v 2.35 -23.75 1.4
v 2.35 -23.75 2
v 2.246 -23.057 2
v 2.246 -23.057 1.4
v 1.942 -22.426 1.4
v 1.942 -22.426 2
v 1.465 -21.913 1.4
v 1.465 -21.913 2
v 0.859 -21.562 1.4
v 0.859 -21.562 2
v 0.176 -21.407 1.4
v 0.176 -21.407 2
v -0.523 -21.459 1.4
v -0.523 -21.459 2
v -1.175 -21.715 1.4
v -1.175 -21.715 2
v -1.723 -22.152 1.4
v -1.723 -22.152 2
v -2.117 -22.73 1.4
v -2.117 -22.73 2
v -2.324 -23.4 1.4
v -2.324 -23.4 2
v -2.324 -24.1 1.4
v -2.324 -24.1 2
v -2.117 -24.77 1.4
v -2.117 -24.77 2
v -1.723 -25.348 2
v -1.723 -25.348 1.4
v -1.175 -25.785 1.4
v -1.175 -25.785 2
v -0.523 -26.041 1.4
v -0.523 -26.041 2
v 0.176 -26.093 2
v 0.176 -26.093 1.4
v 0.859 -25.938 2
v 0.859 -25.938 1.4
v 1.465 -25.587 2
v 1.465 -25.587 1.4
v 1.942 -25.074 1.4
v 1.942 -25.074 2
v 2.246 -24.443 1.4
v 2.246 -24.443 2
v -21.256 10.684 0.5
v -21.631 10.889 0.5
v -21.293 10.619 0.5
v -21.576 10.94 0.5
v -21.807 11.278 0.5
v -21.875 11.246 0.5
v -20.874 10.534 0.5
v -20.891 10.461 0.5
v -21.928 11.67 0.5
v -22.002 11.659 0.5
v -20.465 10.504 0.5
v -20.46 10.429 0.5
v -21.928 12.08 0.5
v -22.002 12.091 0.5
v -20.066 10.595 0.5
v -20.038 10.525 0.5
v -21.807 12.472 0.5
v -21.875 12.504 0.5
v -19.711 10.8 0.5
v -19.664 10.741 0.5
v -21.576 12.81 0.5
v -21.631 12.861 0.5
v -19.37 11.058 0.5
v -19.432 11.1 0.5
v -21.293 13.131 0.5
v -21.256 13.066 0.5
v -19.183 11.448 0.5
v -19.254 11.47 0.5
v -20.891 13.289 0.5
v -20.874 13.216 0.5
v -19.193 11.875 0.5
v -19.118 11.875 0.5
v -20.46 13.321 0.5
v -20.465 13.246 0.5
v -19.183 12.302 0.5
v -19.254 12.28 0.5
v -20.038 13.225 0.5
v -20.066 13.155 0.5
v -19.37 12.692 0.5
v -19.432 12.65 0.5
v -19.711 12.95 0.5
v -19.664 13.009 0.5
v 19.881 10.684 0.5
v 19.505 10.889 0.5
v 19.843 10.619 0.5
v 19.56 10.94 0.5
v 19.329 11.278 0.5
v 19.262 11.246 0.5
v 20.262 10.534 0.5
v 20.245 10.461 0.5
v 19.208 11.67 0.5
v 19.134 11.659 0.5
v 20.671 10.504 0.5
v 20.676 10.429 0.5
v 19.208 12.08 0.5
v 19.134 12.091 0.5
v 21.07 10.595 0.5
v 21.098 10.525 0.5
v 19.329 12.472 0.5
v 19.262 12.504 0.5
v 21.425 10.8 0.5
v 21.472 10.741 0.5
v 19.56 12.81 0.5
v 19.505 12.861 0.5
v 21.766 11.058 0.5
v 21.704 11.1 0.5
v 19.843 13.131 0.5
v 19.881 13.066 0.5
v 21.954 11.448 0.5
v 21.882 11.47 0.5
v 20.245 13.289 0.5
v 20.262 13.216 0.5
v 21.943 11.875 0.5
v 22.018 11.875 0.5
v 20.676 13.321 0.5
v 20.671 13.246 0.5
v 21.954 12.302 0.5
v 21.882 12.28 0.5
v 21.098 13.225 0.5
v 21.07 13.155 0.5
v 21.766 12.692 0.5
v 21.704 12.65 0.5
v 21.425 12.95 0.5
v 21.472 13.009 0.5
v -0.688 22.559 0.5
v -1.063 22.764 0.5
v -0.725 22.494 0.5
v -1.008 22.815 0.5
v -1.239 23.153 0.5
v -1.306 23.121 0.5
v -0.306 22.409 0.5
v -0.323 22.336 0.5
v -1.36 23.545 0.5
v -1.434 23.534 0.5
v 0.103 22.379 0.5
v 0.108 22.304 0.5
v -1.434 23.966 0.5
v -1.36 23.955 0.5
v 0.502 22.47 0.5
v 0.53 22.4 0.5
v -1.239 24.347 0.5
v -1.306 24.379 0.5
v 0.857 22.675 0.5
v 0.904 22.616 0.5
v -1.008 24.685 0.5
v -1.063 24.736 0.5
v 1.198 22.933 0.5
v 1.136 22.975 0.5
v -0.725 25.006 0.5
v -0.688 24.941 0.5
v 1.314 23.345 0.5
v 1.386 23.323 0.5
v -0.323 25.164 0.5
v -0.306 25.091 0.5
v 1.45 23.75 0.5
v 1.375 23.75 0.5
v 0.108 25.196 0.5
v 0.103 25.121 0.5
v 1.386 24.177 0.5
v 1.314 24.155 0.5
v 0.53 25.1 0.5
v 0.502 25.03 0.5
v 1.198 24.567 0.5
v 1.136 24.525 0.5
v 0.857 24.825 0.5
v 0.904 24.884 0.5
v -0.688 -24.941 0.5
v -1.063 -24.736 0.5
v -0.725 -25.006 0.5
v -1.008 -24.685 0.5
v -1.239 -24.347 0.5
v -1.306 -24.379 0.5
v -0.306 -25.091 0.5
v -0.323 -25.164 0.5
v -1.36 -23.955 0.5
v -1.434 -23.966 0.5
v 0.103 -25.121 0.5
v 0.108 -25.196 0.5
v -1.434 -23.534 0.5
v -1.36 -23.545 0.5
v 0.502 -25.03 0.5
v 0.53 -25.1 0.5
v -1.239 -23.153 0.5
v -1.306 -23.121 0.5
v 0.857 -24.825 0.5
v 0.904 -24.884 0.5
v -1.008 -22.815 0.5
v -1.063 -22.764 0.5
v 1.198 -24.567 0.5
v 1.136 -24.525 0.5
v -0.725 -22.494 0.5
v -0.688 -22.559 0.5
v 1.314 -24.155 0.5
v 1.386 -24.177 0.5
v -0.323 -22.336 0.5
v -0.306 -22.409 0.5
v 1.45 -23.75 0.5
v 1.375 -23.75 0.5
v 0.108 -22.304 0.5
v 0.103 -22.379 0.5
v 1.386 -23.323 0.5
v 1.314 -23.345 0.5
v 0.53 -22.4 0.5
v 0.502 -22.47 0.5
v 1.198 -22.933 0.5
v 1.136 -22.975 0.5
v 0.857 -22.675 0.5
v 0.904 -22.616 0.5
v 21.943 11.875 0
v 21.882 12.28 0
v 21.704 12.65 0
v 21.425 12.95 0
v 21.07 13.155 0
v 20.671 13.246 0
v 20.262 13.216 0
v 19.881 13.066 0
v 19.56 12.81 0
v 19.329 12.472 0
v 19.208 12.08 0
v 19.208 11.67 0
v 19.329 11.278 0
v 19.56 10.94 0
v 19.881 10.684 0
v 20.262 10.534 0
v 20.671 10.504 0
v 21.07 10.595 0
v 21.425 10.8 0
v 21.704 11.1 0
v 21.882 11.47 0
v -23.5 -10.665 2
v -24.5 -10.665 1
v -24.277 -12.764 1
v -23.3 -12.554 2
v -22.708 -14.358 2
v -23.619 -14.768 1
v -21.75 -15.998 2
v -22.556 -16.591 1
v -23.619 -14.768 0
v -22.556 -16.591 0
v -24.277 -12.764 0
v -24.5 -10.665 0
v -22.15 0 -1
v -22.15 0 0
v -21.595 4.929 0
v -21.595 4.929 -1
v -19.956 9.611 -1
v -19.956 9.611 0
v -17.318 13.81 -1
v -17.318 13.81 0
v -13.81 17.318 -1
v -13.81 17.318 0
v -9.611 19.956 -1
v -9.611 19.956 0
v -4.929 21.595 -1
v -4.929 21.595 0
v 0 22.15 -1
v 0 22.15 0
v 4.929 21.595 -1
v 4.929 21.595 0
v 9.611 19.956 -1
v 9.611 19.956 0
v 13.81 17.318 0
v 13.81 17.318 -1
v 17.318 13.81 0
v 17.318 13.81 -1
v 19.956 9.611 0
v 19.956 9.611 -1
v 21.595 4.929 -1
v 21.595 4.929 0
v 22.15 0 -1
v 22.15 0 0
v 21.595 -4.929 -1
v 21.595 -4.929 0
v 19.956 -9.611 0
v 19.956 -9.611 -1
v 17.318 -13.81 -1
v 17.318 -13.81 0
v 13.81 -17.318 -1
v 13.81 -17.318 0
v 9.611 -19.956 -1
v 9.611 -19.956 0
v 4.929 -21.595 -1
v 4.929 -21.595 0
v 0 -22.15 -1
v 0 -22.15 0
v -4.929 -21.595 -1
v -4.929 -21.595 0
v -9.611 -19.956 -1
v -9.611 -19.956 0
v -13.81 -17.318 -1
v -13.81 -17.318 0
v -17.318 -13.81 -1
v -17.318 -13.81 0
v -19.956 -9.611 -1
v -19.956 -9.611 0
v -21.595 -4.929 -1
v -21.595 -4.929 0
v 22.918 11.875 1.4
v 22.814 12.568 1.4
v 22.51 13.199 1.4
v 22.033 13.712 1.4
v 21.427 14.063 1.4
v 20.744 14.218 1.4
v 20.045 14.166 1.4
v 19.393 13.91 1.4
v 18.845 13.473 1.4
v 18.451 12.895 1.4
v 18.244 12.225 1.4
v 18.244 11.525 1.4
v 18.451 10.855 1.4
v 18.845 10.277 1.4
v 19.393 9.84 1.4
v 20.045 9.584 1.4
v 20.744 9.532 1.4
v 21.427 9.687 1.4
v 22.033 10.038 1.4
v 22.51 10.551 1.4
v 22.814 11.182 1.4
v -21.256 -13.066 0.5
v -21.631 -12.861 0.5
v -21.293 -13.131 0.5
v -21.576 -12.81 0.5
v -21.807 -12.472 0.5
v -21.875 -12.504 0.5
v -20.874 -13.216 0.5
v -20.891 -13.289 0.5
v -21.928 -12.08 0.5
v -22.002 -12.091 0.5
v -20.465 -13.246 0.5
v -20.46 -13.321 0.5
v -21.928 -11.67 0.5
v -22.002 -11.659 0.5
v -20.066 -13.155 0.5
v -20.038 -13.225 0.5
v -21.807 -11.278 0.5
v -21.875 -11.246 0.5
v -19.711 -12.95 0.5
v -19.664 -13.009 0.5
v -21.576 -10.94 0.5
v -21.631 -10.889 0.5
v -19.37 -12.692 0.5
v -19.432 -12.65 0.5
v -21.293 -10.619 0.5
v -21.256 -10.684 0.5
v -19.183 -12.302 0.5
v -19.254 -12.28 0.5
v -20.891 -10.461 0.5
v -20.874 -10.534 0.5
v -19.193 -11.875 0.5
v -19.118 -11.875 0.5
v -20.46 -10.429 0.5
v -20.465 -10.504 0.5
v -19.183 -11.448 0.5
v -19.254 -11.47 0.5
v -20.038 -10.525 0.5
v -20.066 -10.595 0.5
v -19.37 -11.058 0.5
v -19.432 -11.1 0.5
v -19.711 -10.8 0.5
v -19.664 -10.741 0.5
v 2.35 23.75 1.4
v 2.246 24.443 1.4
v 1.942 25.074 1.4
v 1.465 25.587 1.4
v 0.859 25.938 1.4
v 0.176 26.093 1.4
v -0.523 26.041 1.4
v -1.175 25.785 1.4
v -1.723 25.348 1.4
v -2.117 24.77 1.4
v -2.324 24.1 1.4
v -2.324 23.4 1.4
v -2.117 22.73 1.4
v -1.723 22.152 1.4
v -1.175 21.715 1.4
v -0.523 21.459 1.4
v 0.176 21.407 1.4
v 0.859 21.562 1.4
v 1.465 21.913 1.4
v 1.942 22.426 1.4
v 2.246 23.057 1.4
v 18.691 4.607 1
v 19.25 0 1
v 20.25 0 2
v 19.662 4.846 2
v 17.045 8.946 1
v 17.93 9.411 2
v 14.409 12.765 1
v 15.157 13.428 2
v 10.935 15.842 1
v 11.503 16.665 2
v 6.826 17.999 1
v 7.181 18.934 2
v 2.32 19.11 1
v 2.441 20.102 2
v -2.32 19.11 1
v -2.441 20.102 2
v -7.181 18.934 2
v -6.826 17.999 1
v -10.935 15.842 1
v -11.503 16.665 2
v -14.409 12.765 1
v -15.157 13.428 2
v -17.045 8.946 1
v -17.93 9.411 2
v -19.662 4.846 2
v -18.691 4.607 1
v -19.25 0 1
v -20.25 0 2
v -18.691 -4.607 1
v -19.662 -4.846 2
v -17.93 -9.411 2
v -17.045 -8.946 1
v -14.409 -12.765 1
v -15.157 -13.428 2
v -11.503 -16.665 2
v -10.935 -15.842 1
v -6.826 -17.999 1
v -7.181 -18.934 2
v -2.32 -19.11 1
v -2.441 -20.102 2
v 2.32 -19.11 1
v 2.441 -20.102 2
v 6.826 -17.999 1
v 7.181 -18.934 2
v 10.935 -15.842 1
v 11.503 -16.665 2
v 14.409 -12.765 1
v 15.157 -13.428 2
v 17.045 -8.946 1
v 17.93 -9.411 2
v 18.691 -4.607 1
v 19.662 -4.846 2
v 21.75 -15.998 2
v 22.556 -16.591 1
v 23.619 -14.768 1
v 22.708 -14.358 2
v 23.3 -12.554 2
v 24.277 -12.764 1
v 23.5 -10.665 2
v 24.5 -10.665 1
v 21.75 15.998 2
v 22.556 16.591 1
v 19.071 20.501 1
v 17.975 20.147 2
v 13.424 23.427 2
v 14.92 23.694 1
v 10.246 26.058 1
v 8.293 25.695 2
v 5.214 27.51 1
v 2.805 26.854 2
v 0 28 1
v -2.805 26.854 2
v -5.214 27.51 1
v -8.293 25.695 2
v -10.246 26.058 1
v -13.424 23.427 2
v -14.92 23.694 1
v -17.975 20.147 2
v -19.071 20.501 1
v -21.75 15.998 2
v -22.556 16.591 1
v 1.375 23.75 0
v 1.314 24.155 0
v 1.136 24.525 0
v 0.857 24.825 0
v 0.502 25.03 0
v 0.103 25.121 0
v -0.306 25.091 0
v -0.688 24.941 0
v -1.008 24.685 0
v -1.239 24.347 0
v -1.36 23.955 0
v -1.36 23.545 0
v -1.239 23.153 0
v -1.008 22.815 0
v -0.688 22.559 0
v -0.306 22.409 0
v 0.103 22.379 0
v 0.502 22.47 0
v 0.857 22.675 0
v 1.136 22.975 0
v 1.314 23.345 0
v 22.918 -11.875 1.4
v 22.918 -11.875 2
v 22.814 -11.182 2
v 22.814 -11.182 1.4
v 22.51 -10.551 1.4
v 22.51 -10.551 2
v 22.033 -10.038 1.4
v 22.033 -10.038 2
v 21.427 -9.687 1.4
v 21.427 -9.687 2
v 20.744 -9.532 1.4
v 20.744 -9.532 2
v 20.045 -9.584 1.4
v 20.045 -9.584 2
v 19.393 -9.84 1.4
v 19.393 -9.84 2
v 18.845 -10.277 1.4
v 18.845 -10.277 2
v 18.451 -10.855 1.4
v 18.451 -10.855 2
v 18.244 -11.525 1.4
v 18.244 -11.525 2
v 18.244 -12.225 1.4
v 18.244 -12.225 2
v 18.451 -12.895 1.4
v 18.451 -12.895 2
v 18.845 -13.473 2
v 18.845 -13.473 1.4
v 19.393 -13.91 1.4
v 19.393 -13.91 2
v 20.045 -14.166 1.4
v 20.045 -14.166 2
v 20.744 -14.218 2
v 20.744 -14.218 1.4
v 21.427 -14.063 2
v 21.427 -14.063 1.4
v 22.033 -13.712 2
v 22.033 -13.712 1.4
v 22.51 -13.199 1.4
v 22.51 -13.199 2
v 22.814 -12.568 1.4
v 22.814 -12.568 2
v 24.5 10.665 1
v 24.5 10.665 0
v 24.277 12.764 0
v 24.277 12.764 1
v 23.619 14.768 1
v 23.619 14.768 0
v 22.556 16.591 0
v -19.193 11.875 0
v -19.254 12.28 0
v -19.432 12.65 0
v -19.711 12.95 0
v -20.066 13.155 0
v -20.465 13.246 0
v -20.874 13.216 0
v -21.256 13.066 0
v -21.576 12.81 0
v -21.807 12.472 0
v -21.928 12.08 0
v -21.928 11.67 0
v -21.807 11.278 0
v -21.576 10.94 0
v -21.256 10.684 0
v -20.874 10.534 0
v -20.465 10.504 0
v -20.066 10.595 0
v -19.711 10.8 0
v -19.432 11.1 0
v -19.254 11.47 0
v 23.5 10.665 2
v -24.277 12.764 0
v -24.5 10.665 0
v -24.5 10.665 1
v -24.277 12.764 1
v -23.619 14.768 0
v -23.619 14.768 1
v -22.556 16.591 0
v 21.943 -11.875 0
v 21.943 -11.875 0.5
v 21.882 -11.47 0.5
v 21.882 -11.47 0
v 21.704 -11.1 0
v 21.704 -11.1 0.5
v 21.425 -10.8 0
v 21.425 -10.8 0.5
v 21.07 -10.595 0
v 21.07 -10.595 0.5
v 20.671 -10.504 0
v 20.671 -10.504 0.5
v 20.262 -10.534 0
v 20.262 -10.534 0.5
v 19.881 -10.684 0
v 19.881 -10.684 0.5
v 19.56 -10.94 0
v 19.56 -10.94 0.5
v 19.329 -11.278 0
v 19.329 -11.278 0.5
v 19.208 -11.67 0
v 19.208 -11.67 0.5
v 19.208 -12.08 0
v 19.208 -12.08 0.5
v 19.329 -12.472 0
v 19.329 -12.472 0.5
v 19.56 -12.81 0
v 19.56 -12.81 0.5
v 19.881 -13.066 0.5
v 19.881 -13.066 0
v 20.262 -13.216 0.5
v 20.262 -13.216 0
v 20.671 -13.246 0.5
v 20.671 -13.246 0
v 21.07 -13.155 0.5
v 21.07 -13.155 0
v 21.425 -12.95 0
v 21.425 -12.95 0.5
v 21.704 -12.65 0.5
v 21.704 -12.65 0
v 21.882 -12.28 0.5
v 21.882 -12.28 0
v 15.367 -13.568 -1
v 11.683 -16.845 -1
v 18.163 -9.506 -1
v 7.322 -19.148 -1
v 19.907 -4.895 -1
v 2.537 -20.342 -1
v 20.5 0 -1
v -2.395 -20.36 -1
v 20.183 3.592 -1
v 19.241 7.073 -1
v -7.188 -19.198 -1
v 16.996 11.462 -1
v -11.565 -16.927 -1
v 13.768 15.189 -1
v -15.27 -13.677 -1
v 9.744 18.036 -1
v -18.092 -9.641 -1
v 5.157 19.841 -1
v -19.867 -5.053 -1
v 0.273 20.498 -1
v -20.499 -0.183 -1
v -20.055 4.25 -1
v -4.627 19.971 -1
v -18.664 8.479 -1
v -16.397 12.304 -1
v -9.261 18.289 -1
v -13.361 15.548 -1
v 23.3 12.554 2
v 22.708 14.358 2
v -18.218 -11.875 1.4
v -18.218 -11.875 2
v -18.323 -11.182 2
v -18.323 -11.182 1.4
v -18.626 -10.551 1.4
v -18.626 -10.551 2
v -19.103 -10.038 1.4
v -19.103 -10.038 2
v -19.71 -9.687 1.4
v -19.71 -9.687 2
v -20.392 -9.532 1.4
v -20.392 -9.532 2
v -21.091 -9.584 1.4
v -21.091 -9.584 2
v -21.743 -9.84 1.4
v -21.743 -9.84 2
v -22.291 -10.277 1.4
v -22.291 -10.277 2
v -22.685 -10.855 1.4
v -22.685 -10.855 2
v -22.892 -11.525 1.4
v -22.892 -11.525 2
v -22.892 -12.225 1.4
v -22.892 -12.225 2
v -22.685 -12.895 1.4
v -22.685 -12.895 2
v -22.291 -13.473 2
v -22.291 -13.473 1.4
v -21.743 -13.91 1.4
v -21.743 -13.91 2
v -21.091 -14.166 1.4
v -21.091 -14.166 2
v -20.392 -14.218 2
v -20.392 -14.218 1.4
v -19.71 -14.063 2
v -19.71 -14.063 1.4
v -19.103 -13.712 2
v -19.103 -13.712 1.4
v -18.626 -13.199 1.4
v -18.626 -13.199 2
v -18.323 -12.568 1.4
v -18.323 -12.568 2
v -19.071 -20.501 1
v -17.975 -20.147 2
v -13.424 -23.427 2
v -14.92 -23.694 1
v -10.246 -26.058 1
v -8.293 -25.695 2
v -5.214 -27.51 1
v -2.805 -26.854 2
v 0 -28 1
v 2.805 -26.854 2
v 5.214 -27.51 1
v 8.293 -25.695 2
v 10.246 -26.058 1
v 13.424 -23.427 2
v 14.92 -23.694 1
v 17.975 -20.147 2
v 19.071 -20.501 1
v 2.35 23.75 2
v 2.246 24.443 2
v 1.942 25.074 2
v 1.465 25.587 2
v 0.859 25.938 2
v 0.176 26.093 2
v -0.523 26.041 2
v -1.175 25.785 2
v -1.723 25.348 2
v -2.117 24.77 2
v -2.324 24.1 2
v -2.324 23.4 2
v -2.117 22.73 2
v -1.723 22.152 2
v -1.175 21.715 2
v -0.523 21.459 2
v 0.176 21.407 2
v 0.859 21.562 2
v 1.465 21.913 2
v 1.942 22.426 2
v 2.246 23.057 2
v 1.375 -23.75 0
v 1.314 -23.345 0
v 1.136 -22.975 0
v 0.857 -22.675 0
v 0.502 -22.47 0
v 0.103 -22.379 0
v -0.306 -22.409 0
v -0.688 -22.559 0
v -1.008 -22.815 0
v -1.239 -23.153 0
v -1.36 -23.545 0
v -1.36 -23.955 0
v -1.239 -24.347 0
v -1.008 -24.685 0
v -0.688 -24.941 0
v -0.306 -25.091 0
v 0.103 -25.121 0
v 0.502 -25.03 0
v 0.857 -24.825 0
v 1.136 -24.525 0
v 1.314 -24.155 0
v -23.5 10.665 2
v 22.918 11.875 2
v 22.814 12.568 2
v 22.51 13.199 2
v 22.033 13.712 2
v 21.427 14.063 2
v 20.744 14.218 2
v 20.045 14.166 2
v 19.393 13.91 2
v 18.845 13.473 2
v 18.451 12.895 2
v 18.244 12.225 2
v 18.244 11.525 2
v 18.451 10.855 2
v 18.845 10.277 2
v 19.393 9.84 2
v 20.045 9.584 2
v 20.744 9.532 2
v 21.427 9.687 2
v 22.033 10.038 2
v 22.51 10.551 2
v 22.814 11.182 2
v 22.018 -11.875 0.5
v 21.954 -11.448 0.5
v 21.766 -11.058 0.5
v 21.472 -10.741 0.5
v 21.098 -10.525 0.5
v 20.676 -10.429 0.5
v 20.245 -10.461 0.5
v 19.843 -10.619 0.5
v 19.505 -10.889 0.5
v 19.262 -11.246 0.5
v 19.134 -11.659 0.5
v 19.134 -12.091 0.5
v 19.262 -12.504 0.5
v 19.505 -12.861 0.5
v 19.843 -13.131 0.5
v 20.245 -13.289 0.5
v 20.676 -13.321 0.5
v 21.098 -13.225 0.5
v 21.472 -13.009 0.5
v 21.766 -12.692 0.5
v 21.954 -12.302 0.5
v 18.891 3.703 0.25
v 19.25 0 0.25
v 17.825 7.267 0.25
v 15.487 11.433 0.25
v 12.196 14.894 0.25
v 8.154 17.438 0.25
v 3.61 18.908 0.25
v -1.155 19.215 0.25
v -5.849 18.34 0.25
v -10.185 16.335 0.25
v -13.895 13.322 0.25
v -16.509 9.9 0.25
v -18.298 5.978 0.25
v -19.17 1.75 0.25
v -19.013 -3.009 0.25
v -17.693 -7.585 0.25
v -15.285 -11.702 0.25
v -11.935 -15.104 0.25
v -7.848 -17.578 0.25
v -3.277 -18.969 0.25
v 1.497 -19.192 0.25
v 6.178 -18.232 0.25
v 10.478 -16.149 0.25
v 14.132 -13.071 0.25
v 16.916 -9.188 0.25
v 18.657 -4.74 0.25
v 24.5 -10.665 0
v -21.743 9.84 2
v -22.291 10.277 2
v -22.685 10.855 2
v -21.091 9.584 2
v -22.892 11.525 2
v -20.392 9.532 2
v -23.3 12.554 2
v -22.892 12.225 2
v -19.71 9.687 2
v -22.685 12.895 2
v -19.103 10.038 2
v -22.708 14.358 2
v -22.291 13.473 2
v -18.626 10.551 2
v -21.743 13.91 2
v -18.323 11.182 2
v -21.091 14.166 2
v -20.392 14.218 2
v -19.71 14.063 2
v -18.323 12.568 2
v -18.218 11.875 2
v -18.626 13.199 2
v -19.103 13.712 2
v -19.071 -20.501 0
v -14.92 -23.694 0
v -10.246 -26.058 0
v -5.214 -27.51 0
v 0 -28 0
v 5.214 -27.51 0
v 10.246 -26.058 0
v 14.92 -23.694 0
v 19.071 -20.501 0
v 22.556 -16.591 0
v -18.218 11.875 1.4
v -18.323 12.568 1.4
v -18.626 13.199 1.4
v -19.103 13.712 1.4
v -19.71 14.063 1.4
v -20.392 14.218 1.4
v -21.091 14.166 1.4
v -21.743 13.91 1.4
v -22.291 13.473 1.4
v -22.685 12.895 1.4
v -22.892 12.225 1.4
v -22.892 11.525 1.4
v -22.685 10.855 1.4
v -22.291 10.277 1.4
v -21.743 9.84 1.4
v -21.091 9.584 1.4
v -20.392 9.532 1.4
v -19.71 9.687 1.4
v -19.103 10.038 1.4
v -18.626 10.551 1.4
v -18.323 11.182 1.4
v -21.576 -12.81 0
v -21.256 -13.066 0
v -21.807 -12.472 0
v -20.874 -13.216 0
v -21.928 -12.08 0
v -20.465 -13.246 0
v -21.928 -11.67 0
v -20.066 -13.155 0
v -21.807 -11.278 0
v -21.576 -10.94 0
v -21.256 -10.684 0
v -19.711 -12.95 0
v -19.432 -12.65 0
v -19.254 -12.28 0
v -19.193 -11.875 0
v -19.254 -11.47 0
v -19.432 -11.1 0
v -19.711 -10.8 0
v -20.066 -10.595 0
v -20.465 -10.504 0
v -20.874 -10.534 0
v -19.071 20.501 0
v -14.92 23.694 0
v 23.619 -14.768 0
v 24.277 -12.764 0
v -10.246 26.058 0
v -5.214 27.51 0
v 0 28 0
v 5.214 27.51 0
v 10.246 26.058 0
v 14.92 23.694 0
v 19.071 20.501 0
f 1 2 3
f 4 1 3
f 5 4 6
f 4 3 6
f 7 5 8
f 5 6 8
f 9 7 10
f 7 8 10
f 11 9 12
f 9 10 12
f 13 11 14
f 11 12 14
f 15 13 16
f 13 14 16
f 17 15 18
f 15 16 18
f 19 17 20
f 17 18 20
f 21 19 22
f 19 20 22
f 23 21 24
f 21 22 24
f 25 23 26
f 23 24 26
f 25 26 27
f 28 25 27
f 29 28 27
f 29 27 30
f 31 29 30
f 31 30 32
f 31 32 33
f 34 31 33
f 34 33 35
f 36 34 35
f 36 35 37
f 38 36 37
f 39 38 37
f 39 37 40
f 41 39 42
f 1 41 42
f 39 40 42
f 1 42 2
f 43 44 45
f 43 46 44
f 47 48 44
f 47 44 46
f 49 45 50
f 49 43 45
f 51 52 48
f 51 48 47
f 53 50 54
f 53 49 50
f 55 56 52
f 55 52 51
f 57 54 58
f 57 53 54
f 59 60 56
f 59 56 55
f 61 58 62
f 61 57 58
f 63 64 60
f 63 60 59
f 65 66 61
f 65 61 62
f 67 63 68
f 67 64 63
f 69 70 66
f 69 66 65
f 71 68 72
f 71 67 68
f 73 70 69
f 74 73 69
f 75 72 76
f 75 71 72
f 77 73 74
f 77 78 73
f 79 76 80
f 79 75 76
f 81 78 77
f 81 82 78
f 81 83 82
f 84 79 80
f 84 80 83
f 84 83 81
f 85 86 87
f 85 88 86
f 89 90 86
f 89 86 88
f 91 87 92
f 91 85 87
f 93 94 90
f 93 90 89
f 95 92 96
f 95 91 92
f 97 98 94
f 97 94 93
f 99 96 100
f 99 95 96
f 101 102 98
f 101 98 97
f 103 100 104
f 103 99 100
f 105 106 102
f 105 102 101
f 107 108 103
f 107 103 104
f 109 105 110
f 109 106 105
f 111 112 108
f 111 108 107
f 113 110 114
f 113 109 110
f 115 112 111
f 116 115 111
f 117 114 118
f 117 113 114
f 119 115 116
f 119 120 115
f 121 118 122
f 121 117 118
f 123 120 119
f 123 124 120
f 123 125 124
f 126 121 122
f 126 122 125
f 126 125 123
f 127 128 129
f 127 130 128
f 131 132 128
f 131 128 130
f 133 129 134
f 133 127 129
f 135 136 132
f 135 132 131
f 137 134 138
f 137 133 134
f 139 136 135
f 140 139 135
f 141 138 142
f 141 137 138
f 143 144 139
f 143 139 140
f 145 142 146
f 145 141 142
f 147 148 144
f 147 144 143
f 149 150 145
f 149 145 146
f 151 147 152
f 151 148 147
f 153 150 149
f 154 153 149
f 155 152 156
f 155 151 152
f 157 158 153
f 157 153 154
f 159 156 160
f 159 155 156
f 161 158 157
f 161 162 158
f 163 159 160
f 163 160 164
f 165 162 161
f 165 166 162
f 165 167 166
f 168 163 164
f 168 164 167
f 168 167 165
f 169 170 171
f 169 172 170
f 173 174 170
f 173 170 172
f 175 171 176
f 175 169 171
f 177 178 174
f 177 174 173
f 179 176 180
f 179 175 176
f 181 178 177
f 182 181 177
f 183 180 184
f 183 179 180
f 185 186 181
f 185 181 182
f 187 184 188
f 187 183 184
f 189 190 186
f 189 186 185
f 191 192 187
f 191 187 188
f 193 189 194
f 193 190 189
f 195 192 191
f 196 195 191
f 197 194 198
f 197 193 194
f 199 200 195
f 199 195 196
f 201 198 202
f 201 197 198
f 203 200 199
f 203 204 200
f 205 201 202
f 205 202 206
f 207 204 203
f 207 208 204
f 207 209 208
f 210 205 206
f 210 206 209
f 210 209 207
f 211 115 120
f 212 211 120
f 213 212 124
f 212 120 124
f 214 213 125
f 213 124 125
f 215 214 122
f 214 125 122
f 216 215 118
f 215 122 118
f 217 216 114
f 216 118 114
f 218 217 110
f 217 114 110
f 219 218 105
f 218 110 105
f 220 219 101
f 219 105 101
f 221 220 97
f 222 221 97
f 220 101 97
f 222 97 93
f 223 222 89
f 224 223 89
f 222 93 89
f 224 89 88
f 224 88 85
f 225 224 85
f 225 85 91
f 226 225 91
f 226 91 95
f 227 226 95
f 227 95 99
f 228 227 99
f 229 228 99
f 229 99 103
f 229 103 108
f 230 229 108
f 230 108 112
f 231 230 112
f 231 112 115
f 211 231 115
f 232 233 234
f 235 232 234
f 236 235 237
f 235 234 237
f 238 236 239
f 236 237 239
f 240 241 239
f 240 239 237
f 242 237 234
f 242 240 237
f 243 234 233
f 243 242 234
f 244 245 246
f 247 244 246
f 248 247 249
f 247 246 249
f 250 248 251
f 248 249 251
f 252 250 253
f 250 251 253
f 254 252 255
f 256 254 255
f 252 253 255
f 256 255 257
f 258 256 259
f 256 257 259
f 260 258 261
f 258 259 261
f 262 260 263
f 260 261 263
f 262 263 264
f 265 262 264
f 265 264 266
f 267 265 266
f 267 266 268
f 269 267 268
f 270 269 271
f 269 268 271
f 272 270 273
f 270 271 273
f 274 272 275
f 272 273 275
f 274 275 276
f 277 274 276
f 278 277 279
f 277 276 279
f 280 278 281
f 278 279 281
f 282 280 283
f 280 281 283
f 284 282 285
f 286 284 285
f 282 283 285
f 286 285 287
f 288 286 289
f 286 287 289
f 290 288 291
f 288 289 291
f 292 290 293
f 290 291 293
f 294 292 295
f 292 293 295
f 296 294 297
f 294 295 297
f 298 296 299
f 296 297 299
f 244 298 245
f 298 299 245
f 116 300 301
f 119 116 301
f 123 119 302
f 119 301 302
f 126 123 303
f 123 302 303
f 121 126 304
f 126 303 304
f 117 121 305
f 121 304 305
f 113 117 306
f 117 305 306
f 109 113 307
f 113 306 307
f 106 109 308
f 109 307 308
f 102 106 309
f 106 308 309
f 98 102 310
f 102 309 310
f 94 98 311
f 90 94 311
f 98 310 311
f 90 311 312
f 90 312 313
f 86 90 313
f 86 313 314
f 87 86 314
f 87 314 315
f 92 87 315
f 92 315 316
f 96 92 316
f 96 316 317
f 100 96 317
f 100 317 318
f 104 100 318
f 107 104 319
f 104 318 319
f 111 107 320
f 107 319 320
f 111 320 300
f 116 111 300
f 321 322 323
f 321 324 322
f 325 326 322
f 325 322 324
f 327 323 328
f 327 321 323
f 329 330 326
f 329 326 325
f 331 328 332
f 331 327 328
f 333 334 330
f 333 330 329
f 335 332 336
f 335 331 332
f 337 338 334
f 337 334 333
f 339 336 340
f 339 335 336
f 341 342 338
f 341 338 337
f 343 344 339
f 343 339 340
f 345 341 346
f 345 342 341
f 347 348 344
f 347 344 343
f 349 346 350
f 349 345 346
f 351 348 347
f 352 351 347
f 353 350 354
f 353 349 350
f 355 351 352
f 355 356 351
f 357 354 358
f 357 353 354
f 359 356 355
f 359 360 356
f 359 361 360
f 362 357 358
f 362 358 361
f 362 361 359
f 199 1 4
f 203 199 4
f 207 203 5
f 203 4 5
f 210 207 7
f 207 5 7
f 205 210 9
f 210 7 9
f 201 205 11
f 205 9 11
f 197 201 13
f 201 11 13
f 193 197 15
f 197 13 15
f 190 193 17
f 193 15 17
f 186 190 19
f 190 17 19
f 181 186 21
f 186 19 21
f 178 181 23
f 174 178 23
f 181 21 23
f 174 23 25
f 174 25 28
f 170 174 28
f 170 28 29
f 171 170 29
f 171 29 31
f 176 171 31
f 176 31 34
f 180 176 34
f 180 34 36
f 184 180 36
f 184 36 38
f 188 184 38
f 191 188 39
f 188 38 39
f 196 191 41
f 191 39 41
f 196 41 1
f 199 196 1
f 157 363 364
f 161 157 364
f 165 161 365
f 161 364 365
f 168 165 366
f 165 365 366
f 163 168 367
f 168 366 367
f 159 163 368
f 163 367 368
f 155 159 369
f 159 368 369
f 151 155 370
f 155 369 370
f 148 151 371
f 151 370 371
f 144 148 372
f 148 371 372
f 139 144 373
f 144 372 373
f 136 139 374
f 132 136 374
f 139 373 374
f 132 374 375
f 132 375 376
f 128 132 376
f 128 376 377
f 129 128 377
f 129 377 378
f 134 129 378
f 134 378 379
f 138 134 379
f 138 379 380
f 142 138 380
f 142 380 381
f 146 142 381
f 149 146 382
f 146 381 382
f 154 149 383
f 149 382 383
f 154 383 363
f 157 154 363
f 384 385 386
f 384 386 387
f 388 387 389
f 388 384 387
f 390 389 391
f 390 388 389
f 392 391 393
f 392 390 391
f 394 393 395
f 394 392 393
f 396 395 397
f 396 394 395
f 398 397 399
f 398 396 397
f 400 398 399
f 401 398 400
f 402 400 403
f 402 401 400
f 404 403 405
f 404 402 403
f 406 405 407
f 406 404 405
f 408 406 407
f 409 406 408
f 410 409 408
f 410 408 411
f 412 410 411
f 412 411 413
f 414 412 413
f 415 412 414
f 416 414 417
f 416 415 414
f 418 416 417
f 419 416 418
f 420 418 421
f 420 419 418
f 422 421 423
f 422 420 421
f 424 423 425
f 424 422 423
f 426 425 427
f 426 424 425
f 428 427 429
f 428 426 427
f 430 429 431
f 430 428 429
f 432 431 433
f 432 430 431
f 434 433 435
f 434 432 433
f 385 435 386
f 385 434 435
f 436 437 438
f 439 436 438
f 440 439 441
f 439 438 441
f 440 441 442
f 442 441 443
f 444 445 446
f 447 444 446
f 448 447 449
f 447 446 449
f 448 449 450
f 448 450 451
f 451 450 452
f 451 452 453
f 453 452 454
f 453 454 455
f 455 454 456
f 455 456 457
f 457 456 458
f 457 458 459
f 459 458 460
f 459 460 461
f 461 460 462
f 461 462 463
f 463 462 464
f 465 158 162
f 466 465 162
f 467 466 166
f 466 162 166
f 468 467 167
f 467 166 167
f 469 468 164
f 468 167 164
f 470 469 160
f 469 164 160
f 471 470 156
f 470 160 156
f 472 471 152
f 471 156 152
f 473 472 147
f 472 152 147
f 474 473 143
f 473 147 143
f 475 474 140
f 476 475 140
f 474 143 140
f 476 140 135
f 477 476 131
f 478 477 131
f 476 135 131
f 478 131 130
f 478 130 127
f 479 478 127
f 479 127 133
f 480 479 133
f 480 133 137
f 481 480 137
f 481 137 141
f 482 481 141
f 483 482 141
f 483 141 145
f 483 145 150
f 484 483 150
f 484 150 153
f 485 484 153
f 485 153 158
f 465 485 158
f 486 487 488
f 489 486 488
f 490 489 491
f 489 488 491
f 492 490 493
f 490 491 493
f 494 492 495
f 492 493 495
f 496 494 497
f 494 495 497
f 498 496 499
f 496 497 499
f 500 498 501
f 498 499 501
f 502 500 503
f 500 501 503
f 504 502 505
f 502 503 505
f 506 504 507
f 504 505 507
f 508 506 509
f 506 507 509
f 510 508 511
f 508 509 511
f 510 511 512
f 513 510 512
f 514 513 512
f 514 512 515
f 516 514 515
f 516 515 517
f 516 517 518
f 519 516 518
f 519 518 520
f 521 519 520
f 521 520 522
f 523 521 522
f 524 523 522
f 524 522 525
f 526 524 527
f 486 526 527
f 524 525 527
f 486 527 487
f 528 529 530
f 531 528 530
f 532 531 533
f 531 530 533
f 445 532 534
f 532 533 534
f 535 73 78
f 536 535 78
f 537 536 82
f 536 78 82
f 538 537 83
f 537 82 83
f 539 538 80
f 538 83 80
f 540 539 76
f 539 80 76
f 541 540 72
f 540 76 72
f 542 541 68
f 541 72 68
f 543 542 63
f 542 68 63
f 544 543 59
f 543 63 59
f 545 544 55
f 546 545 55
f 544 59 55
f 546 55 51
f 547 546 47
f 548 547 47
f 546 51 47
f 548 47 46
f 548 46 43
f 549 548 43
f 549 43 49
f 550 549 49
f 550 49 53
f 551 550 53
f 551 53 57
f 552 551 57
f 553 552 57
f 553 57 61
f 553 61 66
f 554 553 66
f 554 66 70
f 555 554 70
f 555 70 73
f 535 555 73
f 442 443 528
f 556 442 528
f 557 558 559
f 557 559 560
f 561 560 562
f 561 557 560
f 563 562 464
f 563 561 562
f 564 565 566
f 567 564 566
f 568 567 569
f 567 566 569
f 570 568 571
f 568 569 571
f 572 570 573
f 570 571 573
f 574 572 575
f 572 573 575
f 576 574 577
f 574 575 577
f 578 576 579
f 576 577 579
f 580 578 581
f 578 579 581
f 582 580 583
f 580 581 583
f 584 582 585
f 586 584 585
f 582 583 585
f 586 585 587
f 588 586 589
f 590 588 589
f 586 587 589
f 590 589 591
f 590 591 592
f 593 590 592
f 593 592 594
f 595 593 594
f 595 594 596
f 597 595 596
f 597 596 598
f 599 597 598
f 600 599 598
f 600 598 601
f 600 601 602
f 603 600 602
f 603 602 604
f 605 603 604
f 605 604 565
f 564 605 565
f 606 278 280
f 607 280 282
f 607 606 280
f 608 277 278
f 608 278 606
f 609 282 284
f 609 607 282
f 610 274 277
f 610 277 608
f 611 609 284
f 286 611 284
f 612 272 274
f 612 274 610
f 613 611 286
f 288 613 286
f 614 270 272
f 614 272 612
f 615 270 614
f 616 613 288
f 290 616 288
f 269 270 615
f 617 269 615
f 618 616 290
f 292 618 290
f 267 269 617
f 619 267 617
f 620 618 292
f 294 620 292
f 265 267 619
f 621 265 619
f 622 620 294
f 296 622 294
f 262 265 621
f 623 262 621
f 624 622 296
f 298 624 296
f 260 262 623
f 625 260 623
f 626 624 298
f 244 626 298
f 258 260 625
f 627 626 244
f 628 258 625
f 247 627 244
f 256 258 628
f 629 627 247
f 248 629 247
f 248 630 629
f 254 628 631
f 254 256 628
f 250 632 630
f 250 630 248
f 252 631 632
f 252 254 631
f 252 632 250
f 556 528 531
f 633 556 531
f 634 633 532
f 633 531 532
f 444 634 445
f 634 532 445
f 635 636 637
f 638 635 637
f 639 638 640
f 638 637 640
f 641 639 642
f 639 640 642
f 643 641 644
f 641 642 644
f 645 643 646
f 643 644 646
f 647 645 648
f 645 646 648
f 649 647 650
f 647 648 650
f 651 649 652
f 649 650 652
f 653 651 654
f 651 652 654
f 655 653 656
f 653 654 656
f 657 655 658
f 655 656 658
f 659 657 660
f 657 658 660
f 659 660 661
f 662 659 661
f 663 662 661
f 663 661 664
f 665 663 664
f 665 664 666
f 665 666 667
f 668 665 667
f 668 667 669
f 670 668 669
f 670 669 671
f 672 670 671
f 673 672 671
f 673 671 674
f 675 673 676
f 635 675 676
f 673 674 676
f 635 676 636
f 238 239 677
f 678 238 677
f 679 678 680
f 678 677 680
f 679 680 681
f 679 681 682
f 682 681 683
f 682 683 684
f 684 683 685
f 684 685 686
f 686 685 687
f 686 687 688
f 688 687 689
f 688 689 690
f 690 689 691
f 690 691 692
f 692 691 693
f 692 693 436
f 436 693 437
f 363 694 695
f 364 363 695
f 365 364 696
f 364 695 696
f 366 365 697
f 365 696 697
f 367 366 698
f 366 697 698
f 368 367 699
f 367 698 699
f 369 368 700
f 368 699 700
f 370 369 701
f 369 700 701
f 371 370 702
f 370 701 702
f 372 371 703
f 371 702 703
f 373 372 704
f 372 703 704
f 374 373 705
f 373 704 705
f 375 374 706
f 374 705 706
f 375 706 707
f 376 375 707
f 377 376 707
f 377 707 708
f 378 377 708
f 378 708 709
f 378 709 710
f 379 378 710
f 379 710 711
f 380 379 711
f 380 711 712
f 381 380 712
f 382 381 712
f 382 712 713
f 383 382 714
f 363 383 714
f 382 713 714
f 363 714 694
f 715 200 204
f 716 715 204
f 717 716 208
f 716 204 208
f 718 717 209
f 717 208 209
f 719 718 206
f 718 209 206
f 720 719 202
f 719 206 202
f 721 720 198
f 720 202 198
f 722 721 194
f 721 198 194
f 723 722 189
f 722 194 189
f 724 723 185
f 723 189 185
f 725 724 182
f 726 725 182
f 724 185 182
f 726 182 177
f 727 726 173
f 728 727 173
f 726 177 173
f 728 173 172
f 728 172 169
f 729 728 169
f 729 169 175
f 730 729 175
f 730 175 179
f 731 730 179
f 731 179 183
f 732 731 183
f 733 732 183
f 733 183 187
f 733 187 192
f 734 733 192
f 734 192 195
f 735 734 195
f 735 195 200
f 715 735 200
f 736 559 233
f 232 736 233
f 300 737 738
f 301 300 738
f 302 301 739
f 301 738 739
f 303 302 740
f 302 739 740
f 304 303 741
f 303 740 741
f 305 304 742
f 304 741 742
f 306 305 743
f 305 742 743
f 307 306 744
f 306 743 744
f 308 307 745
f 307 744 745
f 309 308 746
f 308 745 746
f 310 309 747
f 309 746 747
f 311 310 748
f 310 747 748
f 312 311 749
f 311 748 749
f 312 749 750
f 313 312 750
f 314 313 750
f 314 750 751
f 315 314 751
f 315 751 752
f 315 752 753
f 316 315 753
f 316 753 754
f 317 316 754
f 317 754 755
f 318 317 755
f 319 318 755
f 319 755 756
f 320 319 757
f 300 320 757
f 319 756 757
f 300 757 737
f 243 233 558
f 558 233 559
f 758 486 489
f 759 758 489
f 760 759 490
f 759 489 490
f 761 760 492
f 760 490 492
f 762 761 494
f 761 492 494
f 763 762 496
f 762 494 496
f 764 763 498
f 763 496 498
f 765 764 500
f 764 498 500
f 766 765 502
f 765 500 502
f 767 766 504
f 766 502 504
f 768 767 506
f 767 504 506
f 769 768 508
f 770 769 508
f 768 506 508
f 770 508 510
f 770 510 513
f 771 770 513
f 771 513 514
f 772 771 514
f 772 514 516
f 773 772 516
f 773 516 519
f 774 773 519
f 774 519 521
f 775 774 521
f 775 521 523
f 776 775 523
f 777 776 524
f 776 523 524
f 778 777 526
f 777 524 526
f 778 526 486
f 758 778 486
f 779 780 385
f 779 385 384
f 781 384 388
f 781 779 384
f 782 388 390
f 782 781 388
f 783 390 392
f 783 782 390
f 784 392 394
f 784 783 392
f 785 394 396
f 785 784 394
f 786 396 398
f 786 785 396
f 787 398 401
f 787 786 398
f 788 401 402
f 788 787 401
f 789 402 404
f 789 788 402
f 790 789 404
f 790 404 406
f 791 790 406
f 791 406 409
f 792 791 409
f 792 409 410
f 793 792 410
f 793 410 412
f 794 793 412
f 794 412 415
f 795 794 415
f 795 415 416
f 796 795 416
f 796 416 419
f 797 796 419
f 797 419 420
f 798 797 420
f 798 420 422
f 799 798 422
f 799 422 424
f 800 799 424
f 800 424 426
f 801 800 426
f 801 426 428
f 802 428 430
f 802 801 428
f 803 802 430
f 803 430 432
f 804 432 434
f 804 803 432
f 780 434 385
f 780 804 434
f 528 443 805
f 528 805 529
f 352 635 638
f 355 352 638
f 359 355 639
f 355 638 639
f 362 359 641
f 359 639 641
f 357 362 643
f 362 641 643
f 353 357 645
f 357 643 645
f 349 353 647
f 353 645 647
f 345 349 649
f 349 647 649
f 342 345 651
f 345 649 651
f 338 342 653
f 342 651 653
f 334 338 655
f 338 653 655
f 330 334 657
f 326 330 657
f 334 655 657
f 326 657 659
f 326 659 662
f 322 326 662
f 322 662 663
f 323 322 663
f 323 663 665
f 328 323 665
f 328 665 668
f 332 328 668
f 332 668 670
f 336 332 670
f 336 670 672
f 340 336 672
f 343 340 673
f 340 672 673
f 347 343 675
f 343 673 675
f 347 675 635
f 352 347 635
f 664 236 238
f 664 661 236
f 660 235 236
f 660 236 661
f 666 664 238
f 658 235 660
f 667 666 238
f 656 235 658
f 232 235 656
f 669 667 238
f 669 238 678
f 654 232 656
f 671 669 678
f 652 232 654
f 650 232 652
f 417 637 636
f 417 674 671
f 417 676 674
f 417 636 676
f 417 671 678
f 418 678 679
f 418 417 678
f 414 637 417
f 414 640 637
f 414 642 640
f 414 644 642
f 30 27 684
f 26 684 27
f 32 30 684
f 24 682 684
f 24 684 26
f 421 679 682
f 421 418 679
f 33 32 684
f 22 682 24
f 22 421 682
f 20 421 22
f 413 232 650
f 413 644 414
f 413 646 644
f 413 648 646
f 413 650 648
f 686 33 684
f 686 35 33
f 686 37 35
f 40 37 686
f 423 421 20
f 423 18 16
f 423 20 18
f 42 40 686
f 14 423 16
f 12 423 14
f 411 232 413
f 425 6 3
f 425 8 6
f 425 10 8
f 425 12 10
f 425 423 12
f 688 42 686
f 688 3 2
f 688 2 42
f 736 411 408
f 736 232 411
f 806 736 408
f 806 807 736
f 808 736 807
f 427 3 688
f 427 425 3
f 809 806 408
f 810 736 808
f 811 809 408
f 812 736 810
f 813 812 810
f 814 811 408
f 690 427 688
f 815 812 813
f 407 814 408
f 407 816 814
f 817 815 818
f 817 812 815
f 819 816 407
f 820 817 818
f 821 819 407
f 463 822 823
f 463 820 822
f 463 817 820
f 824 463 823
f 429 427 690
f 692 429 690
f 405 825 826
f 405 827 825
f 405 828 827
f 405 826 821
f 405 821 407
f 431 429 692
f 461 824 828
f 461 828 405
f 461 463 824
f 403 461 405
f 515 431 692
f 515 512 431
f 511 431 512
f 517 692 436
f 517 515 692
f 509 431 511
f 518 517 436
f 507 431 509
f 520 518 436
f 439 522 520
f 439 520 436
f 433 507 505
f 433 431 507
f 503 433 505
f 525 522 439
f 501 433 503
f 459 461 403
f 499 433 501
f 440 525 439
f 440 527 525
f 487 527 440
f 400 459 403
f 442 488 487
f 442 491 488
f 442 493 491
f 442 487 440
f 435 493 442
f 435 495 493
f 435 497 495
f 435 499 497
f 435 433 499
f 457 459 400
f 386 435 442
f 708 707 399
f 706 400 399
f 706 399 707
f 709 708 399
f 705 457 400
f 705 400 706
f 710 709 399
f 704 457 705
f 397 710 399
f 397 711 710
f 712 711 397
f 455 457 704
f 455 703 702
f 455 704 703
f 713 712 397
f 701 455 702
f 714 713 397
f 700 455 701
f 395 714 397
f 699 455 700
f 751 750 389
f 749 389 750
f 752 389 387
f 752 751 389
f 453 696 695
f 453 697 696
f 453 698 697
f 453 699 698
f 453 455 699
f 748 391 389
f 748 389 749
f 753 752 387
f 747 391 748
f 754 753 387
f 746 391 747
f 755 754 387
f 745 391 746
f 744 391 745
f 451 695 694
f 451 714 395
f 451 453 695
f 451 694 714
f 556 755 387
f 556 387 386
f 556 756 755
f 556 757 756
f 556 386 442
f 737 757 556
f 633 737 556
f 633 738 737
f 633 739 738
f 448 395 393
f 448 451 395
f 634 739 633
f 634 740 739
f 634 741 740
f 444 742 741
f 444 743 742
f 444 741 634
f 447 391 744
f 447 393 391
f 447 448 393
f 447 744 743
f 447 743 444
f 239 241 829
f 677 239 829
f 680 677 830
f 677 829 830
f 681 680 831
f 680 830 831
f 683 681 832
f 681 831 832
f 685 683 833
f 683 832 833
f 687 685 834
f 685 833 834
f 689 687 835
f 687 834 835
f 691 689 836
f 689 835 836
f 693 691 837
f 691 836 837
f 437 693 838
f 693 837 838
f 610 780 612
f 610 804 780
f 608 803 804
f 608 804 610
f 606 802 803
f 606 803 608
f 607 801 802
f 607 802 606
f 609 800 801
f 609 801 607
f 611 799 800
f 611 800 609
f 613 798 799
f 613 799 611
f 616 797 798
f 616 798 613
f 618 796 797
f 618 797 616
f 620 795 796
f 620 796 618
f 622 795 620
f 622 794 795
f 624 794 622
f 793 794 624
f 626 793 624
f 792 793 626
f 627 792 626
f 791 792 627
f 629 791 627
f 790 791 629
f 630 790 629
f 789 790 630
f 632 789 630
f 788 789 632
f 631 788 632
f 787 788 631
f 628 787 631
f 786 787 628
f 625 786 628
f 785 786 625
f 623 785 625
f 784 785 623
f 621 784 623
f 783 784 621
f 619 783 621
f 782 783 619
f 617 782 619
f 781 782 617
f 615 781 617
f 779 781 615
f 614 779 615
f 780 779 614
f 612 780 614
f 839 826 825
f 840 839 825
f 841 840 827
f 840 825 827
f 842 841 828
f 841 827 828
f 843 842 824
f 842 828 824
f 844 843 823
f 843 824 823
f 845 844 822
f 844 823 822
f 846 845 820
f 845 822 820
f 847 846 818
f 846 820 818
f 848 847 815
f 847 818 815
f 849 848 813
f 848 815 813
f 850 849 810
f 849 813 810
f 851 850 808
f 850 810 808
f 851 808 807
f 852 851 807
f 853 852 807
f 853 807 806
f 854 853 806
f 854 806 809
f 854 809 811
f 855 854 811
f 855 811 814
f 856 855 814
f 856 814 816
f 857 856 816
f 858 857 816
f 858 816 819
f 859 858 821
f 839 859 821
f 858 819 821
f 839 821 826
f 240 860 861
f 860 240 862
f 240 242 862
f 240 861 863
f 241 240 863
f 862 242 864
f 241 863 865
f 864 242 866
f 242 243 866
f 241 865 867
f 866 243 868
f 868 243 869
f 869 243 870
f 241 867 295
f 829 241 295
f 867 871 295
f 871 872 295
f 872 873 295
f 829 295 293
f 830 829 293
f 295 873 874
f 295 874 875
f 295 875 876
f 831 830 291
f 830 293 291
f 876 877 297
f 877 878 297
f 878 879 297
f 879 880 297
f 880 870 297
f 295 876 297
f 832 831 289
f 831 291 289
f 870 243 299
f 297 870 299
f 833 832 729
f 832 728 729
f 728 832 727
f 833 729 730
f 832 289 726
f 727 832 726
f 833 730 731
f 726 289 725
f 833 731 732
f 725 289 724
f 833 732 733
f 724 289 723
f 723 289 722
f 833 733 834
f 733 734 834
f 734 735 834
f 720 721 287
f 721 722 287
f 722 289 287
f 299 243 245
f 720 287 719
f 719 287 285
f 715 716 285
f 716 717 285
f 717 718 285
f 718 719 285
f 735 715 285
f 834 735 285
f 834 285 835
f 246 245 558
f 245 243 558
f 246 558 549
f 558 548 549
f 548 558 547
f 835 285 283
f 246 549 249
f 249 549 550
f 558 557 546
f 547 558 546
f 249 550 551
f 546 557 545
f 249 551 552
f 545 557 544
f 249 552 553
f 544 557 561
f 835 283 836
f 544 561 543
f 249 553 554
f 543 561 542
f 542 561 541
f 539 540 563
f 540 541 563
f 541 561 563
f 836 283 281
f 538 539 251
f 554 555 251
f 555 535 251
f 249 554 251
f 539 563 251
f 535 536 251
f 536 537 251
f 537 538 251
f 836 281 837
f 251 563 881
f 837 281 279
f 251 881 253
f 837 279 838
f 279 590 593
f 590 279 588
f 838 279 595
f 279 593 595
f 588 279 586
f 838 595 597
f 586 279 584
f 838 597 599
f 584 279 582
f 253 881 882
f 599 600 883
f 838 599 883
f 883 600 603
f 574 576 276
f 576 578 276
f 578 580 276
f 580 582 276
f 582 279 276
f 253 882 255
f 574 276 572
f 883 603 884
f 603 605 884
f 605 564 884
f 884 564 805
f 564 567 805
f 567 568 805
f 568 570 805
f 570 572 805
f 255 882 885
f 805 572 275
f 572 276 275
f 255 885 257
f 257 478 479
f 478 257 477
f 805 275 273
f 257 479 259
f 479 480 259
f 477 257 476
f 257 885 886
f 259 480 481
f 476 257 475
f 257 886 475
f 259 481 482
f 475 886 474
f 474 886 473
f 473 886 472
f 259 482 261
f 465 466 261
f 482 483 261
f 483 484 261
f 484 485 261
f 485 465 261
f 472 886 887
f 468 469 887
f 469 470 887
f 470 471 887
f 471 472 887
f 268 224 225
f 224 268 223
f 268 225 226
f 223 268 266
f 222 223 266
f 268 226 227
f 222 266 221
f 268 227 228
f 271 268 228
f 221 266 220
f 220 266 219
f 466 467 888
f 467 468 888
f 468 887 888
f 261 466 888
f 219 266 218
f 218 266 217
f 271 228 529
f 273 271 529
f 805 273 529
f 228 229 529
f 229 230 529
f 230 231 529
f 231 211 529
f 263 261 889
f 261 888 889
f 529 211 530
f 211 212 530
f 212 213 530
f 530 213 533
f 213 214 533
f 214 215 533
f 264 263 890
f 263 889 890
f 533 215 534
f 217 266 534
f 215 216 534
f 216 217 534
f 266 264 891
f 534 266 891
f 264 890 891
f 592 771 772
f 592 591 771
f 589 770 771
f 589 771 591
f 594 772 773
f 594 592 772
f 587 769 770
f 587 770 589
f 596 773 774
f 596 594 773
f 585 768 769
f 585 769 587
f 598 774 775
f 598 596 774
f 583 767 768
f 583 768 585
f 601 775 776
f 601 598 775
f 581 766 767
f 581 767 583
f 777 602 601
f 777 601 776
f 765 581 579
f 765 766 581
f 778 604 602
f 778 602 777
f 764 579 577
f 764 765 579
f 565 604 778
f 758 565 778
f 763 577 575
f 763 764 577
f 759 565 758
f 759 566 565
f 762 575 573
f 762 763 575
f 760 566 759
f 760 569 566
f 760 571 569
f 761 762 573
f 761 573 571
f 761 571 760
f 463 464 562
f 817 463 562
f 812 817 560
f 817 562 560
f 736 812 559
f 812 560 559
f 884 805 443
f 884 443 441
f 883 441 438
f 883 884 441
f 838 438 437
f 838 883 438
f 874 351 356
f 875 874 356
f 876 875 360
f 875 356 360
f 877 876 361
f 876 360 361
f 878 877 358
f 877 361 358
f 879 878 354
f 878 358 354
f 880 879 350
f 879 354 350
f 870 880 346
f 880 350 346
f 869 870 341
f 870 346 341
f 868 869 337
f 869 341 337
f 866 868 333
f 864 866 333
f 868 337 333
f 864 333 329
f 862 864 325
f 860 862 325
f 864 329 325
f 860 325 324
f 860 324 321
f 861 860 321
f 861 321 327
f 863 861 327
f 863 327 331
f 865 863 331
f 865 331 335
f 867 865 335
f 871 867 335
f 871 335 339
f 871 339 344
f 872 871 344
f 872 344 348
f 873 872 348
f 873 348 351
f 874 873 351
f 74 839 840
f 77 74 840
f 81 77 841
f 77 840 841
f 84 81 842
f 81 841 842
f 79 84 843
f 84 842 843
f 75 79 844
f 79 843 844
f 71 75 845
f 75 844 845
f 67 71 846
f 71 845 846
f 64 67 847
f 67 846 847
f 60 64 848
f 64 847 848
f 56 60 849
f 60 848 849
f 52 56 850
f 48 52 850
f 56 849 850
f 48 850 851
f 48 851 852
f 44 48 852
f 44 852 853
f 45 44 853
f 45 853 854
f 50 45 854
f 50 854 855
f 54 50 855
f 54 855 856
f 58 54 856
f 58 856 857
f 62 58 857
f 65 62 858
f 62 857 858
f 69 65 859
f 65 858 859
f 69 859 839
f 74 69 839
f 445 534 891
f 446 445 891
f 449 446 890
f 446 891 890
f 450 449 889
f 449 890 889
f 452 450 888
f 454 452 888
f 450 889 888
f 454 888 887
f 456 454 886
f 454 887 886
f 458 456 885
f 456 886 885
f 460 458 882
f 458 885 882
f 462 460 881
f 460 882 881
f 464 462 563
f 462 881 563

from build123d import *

# Parameters (mm, degrees)
SKETCH1_R           = 28
SKETCH1_R_2         = 19.25
BOSS_EXTRUDE1_DEPTH = 2
SKETCH2_R           = 22.15
SKETCH2_R_2         = 19.25
BOSS_EXTRUDE2_DEPTH = 1
SKETCH3_R           = 1.375
CUT_EXTRUDE1_DEPTH  = 4
SKETCH4_W           = 12.894615696
SKETCH4_H           = 54.223512158
CUT_EXTRUDE2_DEPTH  = 4
FILLET1_R           = 10
SKETCH5_R           = 2.35
CUT_EXTRUDE3_DEPTH  = 1.5
CHAMFER2_SIZE       = 0.9
CHAMFER1_SIZE       = 1
CHAMFER3_SIZE       = 1.25


with BuildPart() as part:
    # Sketch1 → Boss-Extrude1 (new body)
    with BuildSketch(Plane.XY):
        Circle(SKETCH1_R)
        Circle(SKETCH1_R_2, mode=Mode.SUBTRACT)
    extrude(amount=BOSS_EXTRUDE1_DEPTH)

    # Sketch2 → Boss-Extrude2 (add)
    with BuildSketch(Plane(origin=(0, 0, 0), x_dir=(-1, 0, 0), z_dir=(0, 0, -1))):
        Circle(SKETCH2_R)
        Circle(SKETCH2_R_2, mode=Mode.SUBTRACT)
    extrude(amount=BOSS_EXTRUDE2_DEPTH)

    # Sketch3 → Cut-Extrude1 (cut, through all)
    with BuildSketch(Plane.XY.offset(2)):
        with Locations((0, 23.75)):
            Circle(SKETCH3_R)
        with Locations((20.56810334, 11.875)):
            Circle(SKETCH3_R)
        with Locations((20.56810334, -11.875)):
            Circle(SKETCH3_R)
        with Locations((0, -23.75)):
            Circle(SKETCH3_R)
        with Locations((-20.56810334, -11.875)):
            Circle(SKETCH3_R)
        with Locations((-20.56810334, 11.875)):
            Circle(SKETCH3_R)
    extrude(amount=-CUT_EXTRUDE1_DEPTH, mode=Mode.SUBTRACT)

    # Sketch4 → Cut-Extrude2 (cut, through all)
    with BuildSketch(Plane.XY.offset(2)):
        with Locations((30.947307848, -0.328141479)):
            Rectangle(SKETCH4_W, SKETCH4_H)
        with Locations((-30.947307848, -0.328141479)):
            Rectangle(SKETCH4_W, SKETCH4_H)
    extrude(amount=-CUT_EXTRUDE2_DEPTH, mode=Mode.SUBTRACT)

    # Fillet1
    fillet1_edges = [part.edges().sort_by_distance(p)[0] for p in [
        (24.5, -13.555441712, 1),
        (24.5, 13.555441712, 1),
        (-24.5, 13.555441712, 1),
        (-24.5, -13.555441712, 1),
    ]]
    fillet(fillet1_edges, radius=FILLET1_R)

    # Sketch5 → Cut-Extrude3 (cut)
    with BuildSketch(Plane.XY.offset(2)):
        with Locations((0, 23.75)):
            Circle(SKETCH5_R)
        with Locations((20.56810334, 11.875)):
            Circle(SKETCH5_R)
        with Locations((-20.56810334, 11.875)):
            Circle(SKETCH5_R)
        with Locations((20.56810334, -11.875)):
            Circle(SKETCH5_R)
        with Locations((0, -23.75)):
            Circle(SKETCH5_R)
        with Locations((-20.56810334, -11.875)):
            Circle(SKETCH5_R)
    extrude(amount=-CUT_EXTRUDE3_DEPTH, mode=Mode.SUBTRACT)

    # Chamfer2
    chamfer2_edges = [part.edges().sort_by_distance(p)[0] for p in [
        (-2.35, 23.75, 0.5),
        (-22.91810334, -11.875, 0.5),
        (-2.35, -23.75, 0.5),
        (18.21810334, -11.875, 0.5),
        (-22.91810334, 11.875, 0.5),
        (18.21810334, 11.875, 0.5),
    ]]
    chamfer(chamfer2_edges, length=CHAMFER2_SIZE)

    # Chamfer1
    chamfer1_edges = [part.edges().sort_by_distance(p)[0] for p in [
        (-19.25, 0, 2),
        (0, 28, 2),
        (24.5, 0, 2),
        (-24.5, 0, 2),
        (0, -28, 2),
        (-24.001461876, 13.783412326, 2),
        (-24.001461876, -13.783412326, 2),
        (24.001461876, -13.783412326, 2),
        (24.001461876, 13.783412326, 2),
    ]]
    chamfer(chamfer1_edges, length=CHAMFER1_SIZE)

    # Chamfer3
    chamfer3_edges = [part.edges().sort_by_distance(p)[0] for p in [
        (19.25, 0, -1),
    ]]
    chamfer(chamfer3_edges, length=CHAMFER3_SIZE)


solid = part.part
